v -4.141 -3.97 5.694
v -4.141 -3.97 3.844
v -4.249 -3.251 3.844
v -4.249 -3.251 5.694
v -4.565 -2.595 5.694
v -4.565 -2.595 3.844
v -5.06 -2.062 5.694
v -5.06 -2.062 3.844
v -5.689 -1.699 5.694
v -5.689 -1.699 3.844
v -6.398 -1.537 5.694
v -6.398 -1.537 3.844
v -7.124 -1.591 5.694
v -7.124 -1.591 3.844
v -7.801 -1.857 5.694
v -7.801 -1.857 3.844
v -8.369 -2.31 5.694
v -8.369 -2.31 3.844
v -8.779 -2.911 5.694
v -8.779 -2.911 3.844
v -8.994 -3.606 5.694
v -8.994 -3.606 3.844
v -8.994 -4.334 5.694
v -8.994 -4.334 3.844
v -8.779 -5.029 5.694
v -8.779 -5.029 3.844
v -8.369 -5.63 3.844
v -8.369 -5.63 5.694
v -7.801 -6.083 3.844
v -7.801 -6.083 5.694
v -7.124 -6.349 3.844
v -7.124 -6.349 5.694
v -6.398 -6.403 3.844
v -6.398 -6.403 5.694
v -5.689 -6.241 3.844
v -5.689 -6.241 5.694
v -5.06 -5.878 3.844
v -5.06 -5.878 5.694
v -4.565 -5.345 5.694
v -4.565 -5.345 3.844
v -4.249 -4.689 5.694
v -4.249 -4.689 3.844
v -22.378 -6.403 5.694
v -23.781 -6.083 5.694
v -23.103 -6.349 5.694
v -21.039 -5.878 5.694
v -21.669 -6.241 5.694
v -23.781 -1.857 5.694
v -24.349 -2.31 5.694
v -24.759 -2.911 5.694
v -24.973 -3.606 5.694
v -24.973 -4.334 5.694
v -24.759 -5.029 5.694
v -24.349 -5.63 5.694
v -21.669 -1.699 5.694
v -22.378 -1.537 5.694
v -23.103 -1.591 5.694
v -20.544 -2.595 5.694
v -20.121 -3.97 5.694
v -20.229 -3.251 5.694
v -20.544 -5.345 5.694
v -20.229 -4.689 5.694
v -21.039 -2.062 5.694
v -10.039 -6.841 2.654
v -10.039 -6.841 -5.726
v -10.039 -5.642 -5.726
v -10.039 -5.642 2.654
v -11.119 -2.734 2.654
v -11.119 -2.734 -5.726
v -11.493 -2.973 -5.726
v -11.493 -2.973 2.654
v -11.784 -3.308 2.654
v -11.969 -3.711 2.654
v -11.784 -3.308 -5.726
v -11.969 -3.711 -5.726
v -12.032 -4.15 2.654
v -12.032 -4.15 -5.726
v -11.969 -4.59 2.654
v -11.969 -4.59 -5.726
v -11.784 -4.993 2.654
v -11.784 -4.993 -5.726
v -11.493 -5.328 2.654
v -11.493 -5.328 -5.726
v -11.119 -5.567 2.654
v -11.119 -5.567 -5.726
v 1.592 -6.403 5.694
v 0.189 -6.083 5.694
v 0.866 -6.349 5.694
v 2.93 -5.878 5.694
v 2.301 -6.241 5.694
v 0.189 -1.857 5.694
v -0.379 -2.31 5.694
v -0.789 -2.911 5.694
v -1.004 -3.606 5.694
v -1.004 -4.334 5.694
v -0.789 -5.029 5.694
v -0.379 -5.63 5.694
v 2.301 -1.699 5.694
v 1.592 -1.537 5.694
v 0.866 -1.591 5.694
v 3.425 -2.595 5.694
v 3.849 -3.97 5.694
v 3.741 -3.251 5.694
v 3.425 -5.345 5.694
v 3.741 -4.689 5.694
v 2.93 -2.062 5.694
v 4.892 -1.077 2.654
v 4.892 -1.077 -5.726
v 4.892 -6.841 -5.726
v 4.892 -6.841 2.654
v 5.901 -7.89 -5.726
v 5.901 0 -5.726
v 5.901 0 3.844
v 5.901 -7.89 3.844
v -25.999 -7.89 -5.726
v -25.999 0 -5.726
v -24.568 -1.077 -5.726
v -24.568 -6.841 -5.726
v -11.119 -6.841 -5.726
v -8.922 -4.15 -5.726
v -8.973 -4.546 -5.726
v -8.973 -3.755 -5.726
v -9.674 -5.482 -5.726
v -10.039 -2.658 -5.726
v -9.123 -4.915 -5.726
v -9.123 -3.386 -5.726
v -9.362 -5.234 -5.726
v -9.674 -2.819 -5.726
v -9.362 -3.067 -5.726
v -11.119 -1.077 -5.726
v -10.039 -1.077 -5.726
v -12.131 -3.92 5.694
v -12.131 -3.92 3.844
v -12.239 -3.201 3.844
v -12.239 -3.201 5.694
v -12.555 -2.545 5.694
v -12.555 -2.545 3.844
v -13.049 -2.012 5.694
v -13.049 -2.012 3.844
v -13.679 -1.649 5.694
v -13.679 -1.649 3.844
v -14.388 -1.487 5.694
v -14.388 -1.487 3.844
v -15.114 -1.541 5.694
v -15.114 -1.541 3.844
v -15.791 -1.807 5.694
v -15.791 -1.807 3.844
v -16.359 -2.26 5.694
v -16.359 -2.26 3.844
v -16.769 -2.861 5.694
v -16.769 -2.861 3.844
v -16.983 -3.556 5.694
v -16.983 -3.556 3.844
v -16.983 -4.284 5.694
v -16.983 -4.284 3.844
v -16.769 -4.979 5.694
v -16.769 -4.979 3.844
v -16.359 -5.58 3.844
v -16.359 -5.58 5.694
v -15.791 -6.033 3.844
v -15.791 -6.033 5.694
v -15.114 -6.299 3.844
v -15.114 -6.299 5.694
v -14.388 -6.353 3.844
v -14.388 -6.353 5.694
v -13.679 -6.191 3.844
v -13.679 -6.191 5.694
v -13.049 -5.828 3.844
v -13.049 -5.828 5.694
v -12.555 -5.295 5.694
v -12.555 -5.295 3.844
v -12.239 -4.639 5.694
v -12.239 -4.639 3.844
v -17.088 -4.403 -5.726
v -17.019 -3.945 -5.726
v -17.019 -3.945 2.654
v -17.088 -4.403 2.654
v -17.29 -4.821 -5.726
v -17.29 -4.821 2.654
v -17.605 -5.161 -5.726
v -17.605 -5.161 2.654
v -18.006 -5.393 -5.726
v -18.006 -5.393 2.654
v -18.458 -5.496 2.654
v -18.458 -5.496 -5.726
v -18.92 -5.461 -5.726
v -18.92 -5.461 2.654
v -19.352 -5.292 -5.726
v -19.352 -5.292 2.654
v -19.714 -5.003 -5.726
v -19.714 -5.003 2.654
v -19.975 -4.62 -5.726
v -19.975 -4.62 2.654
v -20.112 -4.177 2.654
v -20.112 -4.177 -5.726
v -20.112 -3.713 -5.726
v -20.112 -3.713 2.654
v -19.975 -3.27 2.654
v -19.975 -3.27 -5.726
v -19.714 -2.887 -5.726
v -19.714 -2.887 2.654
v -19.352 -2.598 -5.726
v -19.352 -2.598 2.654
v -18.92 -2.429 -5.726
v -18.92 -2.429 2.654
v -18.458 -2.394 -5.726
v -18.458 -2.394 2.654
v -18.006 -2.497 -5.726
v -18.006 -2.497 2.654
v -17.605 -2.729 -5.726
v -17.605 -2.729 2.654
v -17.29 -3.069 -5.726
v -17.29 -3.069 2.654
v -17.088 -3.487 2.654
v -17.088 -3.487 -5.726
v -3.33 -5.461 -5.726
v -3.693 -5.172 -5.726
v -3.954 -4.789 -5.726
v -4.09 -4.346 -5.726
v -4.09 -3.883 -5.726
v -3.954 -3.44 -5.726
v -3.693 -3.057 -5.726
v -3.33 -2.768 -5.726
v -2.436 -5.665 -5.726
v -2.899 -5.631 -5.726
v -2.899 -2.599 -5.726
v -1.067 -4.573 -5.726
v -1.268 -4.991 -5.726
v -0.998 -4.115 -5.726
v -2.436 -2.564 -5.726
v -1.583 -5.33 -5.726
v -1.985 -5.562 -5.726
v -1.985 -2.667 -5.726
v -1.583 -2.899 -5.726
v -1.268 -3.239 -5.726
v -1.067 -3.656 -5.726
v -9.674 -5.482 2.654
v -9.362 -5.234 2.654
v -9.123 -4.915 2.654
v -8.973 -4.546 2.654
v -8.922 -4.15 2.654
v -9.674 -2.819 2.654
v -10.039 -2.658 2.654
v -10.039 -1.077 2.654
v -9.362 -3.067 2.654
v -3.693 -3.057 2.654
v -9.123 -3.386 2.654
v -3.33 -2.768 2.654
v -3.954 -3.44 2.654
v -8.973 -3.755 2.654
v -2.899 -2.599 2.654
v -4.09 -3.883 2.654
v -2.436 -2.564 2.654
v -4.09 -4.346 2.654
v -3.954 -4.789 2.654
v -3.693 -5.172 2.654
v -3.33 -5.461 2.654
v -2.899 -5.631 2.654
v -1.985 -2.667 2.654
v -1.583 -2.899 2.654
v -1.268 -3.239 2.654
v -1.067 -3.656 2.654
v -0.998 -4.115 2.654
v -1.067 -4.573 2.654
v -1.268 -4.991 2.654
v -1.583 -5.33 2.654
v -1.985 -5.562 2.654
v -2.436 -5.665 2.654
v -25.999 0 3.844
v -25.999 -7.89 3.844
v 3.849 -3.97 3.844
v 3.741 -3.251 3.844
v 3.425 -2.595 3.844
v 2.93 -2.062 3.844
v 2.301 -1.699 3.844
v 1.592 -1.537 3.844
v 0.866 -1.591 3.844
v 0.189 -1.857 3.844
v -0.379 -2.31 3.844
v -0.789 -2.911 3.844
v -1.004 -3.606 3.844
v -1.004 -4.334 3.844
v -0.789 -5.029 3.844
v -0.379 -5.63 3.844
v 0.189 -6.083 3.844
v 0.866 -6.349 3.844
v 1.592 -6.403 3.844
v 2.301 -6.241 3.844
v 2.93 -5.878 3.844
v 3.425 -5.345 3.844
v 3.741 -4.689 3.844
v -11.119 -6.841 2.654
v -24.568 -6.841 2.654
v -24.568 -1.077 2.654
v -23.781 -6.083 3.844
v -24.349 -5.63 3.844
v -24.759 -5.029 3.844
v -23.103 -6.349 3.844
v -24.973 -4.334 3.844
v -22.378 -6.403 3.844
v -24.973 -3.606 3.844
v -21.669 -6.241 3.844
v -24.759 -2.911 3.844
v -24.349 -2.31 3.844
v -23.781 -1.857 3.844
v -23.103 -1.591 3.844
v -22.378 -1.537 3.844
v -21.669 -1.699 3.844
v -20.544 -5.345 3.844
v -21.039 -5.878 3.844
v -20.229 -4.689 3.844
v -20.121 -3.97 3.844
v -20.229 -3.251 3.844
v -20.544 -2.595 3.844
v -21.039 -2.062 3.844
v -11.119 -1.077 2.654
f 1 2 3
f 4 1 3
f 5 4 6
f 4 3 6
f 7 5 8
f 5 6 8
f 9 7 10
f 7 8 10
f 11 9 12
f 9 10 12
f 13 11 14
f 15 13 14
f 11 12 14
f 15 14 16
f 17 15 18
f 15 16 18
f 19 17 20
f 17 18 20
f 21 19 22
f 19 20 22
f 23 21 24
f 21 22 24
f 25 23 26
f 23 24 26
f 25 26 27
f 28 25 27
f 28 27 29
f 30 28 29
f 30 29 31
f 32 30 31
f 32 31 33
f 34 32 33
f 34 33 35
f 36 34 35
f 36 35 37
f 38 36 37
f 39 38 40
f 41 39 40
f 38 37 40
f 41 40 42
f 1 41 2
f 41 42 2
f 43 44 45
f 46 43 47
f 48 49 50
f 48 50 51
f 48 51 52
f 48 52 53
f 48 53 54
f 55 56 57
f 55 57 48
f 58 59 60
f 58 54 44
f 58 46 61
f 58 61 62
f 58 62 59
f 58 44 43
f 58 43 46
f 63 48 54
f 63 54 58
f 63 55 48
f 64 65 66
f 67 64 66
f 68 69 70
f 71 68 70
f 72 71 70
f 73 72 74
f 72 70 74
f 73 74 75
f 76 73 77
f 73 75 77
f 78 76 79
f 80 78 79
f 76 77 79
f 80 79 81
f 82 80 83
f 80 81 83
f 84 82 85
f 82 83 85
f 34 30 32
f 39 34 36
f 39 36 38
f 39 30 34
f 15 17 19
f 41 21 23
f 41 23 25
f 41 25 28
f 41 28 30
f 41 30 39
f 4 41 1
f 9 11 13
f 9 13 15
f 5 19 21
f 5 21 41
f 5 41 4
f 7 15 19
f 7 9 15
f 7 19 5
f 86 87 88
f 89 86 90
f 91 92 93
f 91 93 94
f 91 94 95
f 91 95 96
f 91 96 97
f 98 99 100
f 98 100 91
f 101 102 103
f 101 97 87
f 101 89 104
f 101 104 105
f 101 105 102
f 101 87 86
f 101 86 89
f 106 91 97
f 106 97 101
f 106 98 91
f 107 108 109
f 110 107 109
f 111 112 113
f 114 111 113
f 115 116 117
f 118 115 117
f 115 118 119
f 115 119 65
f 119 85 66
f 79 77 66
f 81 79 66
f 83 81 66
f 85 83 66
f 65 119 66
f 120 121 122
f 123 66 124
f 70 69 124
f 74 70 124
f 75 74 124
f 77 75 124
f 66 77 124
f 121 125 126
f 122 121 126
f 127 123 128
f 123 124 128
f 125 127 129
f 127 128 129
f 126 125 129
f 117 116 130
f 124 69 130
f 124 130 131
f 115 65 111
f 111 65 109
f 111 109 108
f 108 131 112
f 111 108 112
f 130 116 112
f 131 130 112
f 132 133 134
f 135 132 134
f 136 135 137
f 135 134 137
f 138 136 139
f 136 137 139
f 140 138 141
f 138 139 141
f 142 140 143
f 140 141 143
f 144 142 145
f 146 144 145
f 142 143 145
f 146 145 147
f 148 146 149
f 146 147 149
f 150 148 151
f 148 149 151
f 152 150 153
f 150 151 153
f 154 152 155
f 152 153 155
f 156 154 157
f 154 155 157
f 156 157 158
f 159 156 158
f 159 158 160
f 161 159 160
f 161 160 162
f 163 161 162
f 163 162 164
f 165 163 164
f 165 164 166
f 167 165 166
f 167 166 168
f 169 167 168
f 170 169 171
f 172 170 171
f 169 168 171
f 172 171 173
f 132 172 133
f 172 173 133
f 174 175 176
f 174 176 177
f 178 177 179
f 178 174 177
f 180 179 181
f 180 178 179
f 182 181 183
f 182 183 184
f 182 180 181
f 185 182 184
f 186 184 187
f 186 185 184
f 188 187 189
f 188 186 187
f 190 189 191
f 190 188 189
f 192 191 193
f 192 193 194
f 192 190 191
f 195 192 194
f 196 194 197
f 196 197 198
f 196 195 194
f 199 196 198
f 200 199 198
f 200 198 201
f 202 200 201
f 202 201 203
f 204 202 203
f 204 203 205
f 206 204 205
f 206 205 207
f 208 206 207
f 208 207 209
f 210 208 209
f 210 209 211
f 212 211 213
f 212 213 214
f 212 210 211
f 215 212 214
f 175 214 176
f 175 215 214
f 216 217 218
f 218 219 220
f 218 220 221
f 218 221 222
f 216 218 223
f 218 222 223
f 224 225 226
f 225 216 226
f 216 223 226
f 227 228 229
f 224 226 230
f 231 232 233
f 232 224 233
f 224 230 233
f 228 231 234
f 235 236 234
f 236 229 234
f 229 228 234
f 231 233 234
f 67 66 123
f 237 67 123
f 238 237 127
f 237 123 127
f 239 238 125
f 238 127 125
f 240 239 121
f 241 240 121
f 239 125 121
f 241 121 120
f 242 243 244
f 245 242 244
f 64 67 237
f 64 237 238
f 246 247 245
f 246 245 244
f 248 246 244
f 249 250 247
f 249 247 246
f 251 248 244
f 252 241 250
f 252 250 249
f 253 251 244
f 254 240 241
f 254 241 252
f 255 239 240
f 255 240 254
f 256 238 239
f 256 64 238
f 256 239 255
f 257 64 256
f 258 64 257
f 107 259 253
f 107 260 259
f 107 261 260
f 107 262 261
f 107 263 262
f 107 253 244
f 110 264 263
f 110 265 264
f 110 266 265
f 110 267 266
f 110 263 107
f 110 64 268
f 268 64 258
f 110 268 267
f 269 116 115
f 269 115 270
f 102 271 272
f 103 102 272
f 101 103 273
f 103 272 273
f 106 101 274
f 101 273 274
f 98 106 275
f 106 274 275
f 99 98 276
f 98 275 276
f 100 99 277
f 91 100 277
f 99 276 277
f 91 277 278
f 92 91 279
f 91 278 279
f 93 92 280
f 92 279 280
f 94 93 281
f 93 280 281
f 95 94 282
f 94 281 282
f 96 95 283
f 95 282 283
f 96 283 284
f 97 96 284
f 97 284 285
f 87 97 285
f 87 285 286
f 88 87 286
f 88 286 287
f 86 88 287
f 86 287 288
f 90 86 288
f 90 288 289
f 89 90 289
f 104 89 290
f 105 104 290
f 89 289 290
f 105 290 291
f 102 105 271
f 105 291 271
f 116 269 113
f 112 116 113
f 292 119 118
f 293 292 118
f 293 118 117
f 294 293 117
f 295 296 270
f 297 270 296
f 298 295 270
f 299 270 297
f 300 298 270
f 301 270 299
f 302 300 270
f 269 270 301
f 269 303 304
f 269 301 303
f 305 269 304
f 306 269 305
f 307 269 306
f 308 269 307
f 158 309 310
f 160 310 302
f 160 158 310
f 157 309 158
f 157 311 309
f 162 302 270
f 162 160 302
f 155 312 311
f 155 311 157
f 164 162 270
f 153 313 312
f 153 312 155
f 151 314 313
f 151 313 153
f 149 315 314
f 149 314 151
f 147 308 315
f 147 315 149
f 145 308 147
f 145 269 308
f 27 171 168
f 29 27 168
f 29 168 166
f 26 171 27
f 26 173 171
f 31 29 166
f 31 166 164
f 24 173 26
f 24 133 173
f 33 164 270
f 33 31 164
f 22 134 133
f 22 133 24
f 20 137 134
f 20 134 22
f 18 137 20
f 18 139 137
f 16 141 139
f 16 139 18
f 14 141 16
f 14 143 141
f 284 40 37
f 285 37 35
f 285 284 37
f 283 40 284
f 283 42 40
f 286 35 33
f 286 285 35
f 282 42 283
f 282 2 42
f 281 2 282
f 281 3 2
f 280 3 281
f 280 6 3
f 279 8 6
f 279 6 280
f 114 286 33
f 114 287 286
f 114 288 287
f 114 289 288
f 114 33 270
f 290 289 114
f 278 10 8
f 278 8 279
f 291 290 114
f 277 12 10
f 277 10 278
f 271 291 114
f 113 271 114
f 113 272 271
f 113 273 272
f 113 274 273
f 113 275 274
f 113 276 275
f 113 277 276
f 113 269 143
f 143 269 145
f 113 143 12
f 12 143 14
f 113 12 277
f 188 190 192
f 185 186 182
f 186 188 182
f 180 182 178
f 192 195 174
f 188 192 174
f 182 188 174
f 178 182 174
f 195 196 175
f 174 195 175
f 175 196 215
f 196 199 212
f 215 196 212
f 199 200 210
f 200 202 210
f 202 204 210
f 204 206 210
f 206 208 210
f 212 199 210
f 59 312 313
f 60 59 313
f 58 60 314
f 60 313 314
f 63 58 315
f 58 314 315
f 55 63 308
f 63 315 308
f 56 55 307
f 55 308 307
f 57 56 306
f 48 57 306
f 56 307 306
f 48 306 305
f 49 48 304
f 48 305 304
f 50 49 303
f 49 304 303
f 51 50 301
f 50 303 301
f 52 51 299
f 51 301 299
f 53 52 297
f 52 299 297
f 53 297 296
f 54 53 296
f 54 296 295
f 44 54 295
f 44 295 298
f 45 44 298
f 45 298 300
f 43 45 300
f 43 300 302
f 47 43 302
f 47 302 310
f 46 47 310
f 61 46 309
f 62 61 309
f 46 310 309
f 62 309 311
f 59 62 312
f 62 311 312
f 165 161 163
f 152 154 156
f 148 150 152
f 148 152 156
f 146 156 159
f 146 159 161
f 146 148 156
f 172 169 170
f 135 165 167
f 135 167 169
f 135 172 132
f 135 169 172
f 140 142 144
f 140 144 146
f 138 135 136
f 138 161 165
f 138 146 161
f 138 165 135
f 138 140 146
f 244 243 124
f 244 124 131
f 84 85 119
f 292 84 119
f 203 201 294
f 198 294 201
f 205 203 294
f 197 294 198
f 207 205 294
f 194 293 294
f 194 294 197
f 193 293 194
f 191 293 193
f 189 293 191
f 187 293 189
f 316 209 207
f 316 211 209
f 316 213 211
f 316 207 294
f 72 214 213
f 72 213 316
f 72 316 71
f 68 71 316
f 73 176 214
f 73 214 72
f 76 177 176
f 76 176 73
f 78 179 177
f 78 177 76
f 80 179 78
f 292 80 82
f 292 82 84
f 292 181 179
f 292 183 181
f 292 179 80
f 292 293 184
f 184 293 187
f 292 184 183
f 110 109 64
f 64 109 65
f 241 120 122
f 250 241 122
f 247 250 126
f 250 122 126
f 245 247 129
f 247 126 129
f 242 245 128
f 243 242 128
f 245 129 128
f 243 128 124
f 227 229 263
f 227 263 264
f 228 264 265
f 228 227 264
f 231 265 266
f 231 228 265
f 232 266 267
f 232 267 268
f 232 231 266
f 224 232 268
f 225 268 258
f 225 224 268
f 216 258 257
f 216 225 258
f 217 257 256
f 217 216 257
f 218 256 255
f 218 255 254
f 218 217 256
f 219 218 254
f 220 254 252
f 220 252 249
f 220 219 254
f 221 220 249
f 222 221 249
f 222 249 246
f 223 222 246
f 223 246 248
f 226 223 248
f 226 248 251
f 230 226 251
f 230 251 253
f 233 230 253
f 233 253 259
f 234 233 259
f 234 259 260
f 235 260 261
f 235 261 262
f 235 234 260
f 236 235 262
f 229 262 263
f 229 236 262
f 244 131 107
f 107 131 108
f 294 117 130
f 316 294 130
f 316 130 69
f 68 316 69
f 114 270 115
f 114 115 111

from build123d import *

# Parameters (mm, degrees)
F0_W     = 31.9
F0_H     = 9.57
F1_DEPTH = 7.89
F2_R     = 2.44
F3_DEPTH = 1.85
F4_R     = 1.555
F5_DEPTH = 8.38


with BuildPart() as f1:
    # F0 (on Front) → F1 (new body)
    with BuildSketch(Plane.XZ):
        with Locations((-10.049382, -0.941054)):
            Rectangle(F0_W, F0_H)
    extrude(amount=F1_DEPTH)

    # F2 (on face) → F3 (join)
    with BuildSketch(Plane.XY.offset(3.843946)):
        with Locations((-22.560522, -3.97)):
            Circle(F2_R)
        with Locations((-14.570678, -3.92)):
            Circle(F2_R)
        with Locations((-6.580835, -3.97)):
            Circle(F2_R)
        with Locations((1.409165, -3.97)):
            Circle(F2_R)
    extrude(amount=F3_DEPTH)

    # F4 (on face) → F5 (cut)
    with BuildSketch(Plane(origin=(0, 0, -5.726054), x_dir=(1, 0, 0), z_dir=(0, 0, -1))):
        with BuildLine():
            Line((-11.118799, 6.840625), (-24.567948, 6.840625))
            Line((-24.567948, 6.840625), (-24.567948, 1.076743))
            Line((-24.567948, 1.076743), (-11.118799, 1.076743))
            Line((-11.118799, 1.076743), (-11.118799, 2.733773))
            ThreePointArc((-11.118799, 2.733773), (-12.032356, 4.15031), (-11.118799, 5.566847))
            Line((-11.118799, 5.566847), (-11.118799, 6.840625))
        make_face()
        with Locations((-18.574382, 3.945)):
            Circle(F4_R, mode=Mode.SUBTRACT)
        with BuildLine():
            Line((4.891893, 6.840625), (-10.038799, 6.840625))
            Line((-10.038799, 6.840625), (-10.038799, 5.642185))
            ThreePointArc((-10.038799, 5.642185), (-9.23237, 5.081993), (-8.922356, 4.15031))
            ThreePointArc((-8.922356, 4.15031), (-9.23237, 3.218627), (-10.038799, 2.658435))
            Line((-10.038799, 2.658435), (-10.038799, 1.076743))
            Line((-10.038799, 1.076743), (4.891893, 1.076743))
            Line((4.891893, 1.076743), (4.891893, 6.840625))
        make_face()
        with Locations((-2.552682, 4.114562)):
            Circle(F4_R, mode=Mode.SUBTRACT)
    extrude(amount=-F5_DEPTH, mode=Mode.SUBTRACT)


solid = f1.part
